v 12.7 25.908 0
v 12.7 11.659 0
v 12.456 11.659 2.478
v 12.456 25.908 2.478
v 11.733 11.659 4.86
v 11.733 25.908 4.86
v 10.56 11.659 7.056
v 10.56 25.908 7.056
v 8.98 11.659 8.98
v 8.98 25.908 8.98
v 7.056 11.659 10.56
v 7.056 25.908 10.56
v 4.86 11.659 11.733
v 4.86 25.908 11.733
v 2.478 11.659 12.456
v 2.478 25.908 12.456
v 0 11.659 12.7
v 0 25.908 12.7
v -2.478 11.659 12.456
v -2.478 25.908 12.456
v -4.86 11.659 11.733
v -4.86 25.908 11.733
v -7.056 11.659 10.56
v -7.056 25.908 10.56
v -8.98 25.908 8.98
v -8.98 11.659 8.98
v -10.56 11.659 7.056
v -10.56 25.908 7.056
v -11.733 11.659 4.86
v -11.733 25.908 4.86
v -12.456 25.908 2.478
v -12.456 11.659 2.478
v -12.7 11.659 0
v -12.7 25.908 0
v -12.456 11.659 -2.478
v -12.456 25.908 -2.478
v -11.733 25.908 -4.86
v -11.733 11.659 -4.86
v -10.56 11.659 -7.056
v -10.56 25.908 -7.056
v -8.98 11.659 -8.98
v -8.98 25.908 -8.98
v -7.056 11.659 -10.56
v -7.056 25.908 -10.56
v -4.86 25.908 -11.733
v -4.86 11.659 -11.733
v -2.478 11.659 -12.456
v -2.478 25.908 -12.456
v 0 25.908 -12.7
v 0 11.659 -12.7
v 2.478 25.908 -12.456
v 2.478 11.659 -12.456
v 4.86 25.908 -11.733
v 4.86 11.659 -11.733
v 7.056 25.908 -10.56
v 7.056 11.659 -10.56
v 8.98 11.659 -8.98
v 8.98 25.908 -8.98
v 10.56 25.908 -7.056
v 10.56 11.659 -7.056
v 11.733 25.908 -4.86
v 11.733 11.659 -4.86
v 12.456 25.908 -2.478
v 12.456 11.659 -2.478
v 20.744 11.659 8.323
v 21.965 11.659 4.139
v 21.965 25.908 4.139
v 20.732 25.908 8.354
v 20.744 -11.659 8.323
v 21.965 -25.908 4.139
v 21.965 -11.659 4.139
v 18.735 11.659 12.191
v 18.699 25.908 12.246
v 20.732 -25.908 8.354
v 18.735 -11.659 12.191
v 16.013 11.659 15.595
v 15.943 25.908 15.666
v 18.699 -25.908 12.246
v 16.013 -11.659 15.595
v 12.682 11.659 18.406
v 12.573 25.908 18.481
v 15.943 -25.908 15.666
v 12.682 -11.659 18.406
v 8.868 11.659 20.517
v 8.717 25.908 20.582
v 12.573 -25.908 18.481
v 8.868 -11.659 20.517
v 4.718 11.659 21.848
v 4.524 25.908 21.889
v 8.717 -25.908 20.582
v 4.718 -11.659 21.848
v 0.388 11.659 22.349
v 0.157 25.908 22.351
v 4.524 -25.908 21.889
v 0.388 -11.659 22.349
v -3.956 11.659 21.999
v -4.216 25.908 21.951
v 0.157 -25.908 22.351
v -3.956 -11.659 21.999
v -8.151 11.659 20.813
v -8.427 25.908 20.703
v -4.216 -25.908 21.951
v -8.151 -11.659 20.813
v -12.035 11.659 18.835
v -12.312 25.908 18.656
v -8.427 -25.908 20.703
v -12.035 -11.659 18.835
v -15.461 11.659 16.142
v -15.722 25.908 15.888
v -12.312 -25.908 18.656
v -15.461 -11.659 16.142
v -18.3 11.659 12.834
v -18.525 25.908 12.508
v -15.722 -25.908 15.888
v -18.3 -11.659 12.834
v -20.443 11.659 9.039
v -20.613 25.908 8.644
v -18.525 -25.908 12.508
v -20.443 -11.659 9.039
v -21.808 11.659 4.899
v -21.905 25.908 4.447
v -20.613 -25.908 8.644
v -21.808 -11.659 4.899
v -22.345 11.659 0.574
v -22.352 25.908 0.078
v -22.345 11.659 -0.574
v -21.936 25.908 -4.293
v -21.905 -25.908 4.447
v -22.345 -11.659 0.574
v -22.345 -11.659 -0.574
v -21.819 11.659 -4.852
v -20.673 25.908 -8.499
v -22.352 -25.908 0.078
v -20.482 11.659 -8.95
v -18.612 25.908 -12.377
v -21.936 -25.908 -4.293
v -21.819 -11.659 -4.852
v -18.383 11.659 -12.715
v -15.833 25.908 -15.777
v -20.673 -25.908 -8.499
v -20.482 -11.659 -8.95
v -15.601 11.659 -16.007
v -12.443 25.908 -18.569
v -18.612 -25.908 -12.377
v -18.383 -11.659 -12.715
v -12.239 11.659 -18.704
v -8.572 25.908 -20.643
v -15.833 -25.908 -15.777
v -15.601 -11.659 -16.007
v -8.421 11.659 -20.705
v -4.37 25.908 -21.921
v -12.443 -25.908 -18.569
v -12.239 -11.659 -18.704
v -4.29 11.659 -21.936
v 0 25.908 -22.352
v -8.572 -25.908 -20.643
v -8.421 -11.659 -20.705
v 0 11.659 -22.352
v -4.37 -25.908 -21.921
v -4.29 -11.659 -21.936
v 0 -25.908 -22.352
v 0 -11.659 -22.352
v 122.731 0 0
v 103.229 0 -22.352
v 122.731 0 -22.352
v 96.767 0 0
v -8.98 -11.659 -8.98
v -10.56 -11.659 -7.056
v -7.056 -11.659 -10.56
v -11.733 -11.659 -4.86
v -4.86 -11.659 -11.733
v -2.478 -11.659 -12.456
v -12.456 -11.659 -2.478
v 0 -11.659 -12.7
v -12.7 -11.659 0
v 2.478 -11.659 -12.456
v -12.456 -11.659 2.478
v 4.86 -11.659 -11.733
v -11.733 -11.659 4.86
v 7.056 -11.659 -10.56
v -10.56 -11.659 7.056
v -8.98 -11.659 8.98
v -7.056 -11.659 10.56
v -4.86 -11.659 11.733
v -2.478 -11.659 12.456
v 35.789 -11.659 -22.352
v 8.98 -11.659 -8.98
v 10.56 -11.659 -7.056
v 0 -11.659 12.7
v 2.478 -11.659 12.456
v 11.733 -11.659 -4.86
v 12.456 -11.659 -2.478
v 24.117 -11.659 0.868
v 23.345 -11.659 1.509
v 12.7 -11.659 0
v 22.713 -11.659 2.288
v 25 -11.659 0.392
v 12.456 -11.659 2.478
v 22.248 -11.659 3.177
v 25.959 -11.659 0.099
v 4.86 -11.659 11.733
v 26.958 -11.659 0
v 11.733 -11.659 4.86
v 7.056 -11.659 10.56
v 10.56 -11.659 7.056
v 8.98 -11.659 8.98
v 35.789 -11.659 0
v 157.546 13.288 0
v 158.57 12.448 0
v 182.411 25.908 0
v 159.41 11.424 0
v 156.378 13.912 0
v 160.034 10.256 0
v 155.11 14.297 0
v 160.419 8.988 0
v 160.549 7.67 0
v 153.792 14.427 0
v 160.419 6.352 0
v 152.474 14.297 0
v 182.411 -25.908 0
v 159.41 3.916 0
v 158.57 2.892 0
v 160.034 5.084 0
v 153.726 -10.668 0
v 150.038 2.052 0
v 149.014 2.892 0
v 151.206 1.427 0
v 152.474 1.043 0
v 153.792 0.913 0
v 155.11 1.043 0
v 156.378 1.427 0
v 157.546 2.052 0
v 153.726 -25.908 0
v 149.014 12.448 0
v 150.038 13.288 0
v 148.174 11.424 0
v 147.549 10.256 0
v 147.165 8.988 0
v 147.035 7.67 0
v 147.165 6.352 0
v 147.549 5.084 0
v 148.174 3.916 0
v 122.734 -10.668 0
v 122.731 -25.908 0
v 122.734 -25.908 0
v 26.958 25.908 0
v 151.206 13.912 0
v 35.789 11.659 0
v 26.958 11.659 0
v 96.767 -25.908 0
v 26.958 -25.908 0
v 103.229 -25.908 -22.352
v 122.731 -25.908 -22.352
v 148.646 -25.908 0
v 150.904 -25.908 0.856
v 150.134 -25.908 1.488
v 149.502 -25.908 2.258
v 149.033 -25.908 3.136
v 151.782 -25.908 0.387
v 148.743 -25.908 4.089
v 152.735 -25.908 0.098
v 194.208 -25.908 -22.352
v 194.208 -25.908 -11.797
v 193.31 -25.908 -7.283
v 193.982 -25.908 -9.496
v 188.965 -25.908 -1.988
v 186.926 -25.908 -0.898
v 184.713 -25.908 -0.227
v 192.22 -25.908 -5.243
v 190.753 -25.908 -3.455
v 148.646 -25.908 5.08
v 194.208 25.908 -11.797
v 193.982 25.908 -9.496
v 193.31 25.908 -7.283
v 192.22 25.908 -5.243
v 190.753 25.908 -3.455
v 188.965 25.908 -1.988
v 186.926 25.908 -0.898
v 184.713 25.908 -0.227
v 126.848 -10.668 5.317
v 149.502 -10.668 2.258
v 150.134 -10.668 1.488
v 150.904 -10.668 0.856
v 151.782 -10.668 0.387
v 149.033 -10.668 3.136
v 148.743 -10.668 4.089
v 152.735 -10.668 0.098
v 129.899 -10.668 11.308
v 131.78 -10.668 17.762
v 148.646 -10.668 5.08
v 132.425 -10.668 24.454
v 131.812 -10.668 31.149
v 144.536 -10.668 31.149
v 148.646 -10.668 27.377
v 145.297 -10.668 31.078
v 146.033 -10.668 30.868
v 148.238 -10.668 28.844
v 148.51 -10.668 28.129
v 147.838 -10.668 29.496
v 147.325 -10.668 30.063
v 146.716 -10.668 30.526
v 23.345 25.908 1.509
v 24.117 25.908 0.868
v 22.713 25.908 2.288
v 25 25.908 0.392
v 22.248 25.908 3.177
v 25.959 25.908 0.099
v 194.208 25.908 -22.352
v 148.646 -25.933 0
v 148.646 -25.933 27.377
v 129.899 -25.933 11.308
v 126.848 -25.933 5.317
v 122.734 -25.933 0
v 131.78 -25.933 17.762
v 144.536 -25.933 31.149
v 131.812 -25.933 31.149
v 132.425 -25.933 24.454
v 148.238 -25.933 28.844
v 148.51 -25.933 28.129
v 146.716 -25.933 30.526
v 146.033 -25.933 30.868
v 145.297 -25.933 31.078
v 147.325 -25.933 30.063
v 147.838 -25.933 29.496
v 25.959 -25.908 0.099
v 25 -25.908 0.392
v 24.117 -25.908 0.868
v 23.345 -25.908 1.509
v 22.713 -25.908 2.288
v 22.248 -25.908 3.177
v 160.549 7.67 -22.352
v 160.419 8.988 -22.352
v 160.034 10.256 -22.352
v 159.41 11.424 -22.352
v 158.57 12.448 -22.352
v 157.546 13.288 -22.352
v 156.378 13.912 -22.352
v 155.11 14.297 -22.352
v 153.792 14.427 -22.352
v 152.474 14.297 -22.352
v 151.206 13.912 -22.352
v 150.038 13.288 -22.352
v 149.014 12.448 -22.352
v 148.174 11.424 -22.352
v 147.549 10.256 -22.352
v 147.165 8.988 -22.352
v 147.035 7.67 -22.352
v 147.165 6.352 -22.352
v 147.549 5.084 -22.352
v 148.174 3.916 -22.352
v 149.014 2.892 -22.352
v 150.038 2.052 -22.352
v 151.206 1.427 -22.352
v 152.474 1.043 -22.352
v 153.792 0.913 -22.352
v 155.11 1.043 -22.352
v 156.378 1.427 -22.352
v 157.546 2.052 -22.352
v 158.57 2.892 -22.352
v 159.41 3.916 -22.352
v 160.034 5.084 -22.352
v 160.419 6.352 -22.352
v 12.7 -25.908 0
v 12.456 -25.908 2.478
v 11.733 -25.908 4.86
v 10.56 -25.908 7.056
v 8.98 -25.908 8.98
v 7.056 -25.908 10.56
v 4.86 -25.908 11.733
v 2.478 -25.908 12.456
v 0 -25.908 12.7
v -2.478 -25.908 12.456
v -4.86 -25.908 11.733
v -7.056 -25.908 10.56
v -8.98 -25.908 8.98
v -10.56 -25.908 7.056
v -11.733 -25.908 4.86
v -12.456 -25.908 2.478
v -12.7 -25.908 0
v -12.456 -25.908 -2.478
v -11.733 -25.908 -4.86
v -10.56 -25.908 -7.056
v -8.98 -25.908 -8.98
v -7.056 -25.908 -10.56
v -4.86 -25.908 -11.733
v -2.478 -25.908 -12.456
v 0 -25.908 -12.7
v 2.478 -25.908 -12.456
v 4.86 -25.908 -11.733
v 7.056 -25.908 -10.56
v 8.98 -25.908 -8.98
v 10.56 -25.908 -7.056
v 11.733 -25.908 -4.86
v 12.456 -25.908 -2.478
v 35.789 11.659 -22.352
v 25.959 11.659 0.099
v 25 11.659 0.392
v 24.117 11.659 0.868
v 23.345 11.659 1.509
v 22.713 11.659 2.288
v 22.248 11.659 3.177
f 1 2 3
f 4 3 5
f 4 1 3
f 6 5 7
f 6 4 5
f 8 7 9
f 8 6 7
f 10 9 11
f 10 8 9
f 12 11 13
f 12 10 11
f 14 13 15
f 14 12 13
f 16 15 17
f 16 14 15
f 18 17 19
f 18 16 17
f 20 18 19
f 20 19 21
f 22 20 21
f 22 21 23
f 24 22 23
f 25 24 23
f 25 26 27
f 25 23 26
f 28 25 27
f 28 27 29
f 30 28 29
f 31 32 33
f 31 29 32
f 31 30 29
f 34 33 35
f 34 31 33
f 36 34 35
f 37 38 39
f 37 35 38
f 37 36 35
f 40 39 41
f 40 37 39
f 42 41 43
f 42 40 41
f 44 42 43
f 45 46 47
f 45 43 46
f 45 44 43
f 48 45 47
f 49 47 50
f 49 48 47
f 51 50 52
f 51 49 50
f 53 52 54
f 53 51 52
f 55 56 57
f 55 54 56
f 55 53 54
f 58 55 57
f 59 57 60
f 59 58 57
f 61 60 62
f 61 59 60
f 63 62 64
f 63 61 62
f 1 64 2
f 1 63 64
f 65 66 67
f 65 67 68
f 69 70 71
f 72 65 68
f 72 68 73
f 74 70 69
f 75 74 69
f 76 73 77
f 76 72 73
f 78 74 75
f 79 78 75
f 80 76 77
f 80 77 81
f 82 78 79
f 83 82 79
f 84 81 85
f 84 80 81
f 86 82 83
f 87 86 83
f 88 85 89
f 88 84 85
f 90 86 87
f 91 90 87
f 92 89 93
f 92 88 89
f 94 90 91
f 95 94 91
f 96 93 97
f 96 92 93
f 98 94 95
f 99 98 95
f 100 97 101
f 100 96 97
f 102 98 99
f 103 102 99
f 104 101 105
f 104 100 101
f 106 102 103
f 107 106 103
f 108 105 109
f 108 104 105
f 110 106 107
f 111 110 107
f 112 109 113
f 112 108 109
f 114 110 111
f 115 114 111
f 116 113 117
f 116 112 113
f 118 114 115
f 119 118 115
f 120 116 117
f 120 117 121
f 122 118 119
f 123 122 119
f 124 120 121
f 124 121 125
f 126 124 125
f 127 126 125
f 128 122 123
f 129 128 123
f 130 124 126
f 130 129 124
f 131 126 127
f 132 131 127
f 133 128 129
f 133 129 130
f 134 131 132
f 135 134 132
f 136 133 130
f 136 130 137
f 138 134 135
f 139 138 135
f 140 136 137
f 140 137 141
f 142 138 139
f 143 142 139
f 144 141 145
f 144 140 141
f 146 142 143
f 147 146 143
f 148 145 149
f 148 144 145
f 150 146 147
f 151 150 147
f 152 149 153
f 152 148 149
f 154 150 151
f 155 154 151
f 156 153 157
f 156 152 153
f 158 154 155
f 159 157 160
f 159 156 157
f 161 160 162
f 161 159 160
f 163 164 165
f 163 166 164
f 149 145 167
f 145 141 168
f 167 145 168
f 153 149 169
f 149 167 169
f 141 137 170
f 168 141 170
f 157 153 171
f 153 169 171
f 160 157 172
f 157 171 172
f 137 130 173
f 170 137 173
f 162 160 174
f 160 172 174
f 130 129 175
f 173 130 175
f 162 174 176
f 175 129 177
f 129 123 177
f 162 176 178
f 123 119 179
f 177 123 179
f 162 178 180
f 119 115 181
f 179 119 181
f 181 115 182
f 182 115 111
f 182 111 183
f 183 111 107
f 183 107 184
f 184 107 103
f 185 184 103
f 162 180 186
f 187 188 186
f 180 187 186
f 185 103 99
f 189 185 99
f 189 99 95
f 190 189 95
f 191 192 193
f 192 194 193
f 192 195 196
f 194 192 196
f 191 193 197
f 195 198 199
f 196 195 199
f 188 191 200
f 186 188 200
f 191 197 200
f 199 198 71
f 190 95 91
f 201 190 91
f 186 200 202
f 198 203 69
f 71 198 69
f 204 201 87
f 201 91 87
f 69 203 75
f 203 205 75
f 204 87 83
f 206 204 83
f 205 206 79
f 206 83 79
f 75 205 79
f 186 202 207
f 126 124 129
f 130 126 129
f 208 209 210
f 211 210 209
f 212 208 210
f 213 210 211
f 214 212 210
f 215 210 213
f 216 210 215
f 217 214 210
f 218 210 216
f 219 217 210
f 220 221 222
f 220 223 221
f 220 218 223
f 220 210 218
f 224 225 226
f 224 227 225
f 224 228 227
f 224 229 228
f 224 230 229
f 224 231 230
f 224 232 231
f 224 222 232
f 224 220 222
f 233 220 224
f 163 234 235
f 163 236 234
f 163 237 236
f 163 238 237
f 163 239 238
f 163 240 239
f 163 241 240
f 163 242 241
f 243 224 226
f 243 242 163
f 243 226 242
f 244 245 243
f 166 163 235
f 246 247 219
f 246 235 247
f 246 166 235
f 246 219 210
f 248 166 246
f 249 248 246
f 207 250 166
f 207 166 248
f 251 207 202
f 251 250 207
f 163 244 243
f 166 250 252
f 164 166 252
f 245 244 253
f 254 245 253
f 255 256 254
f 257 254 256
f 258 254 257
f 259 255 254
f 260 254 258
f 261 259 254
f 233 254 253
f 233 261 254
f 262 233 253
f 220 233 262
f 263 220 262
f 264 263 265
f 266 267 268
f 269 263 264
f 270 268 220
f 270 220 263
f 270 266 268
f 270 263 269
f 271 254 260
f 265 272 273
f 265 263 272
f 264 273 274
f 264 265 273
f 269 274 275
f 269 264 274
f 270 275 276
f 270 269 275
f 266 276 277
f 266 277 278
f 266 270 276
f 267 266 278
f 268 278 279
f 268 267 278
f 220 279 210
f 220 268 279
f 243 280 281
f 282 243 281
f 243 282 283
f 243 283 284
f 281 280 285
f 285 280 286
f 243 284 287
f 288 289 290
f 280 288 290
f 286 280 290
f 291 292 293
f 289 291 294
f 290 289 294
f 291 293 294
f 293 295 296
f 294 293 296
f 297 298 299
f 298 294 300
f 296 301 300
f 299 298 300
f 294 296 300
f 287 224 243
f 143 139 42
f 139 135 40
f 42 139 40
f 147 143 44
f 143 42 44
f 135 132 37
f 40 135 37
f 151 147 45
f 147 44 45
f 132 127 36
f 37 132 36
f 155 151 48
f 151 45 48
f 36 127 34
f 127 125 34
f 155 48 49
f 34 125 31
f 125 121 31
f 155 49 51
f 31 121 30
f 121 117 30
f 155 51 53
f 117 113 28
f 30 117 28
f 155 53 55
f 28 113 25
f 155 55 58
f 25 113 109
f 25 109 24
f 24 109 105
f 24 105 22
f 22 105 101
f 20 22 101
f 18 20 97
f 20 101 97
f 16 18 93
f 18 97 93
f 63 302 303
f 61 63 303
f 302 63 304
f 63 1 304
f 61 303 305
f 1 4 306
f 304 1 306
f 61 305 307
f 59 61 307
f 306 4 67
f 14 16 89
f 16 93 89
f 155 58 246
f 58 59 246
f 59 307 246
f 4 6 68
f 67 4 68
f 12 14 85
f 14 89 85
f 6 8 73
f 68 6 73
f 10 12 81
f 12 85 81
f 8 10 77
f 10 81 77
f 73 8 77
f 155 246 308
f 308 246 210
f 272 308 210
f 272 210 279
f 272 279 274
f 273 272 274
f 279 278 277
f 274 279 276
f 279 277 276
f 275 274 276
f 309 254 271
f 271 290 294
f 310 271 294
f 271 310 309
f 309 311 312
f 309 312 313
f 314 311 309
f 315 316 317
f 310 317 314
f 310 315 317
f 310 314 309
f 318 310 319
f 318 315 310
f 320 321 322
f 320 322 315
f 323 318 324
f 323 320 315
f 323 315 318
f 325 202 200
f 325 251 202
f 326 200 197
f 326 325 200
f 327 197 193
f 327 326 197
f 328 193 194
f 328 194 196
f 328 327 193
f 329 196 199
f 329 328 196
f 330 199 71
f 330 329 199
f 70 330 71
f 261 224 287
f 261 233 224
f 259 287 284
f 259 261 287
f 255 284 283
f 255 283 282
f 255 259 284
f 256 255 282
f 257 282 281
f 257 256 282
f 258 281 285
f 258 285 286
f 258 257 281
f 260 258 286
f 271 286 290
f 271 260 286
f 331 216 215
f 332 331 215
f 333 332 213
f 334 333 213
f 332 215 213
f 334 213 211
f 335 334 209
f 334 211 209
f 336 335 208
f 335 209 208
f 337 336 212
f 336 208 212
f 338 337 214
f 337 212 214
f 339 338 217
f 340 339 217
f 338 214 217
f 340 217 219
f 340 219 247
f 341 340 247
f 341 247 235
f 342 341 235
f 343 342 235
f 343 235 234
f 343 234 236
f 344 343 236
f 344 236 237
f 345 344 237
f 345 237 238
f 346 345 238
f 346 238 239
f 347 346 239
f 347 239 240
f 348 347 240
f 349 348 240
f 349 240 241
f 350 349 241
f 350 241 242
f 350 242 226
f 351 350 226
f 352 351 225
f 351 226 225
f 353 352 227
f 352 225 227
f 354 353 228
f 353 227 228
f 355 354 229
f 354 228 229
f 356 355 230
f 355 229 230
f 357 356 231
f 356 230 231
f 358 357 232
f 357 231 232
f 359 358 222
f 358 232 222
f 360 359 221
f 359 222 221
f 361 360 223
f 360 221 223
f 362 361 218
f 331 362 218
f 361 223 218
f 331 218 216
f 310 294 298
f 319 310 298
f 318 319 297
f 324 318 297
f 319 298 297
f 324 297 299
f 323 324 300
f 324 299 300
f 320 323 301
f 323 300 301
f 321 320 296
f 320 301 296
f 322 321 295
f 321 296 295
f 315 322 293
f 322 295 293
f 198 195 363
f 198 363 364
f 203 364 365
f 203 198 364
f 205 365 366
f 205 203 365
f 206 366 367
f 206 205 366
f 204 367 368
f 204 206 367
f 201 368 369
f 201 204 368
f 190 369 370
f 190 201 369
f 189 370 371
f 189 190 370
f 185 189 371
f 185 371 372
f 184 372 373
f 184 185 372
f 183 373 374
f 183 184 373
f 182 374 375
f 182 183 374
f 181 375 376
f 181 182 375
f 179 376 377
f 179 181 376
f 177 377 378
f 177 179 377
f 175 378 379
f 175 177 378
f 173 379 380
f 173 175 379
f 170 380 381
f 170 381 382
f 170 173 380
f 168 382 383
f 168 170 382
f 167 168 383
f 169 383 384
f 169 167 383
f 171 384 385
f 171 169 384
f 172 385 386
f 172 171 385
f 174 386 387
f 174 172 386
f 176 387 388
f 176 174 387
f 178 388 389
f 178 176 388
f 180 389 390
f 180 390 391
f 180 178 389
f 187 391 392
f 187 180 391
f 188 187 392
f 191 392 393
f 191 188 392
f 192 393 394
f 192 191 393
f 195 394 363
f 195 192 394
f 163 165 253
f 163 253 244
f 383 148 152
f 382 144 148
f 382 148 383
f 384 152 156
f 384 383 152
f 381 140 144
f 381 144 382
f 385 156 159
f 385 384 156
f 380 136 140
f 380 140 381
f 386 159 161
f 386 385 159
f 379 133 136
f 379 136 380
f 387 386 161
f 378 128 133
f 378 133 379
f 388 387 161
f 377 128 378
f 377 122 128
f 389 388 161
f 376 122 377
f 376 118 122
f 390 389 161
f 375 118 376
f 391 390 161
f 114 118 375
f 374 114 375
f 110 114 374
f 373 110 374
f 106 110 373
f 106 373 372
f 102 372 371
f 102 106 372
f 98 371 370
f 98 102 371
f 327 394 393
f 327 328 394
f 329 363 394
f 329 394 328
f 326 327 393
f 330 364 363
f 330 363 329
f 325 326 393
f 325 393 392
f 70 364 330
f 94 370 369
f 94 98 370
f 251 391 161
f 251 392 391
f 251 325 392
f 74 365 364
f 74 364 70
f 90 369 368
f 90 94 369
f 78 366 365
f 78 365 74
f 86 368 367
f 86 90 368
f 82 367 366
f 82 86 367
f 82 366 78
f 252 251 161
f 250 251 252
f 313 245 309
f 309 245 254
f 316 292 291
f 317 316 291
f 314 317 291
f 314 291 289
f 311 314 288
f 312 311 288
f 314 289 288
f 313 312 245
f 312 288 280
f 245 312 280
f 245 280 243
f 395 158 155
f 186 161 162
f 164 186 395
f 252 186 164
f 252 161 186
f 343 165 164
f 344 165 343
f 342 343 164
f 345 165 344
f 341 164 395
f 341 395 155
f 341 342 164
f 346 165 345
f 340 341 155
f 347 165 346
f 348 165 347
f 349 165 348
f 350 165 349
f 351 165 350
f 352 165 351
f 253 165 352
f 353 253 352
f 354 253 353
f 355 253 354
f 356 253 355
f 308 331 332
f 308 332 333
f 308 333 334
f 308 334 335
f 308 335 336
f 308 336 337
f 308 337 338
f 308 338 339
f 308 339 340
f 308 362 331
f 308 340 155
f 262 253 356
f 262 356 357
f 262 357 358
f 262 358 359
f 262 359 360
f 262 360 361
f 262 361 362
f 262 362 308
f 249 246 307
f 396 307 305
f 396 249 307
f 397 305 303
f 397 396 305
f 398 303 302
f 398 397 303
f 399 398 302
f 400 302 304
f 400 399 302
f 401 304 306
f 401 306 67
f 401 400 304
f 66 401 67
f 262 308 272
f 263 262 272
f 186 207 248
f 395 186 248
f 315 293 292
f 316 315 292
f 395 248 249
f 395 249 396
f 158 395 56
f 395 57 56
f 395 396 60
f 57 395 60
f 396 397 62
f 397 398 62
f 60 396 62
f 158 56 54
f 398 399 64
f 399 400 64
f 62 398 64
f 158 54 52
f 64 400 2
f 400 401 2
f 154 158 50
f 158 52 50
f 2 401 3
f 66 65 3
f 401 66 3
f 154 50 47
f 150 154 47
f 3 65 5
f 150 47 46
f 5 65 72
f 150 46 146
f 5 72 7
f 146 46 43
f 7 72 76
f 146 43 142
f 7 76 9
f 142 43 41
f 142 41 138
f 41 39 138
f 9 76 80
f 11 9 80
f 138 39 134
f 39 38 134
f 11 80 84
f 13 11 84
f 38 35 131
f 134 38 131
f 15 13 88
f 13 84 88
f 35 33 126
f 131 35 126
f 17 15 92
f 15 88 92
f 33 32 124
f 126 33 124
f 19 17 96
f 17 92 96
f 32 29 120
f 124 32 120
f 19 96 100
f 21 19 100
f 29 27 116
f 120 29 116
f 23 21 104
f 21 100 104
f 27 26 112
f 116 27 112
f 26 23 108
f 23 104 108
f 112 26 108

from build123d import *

# Parameters (mm, degrees)
F0_R          = 12.7
F4_DEPTH      = 25.908
F5_DEPTH      = 14.732
F5_DEPTH_BACK = 0.5334
F6_DEPTH      = 51.816
F7_R          = 6.7567647924
F8_DEPTH      = 76.454
F10_DEPTH     = 115.57
F11_R         = 5.08


with BuildPart() as f4:
    # F0 (on Front) → F4 (new body, symmetric)
    with BuildSketch(Plane.XZ):
        with BuildLine():
            Line((182.4113020967, 0), (22.352, 0))
            ThreePointArc((22.352, 0), (-15.8052507731, 15.8052507731), (0, -22.352))
            Line((0, -22.352), (194.2084, -22.352))
            Line((194.2084, -22.352), (194.2084, -11.7970979033))
            ThreePointArc((194.2084, -11.7970979033), (190.7531100225, -3.4552899775), (182.4113020967, 0))
        make_face()
        Circle(F0_R, mode=Mode.SUBTRACT)
    extrude(amount=F4_DEPTH, both=True)

    # F3 (on offset) → F5 (join, two sides)
    with BuildSketch(Plane.XZ.offset(25.4)) as f5_sk:
        with BuildLine():
            ThreePointArc((131.8115741014, 31.148834154), (130.990690219, 14.4909643817), (122.7341517806, 0))
            Line((122.7341517806, 0), (148.645862937, 0))
            Line((148.645862937, 0), (148.645862937, 27.3769088089))
            ThreePointArc((148.645862937, 27.3769088089), (147.3251483028, 30.062921432), (144.5359289646, 31.148834154))
            Line((144.5359289646, 31.148834154), (131.8115741014, 31.148834154))
        make_face()
    extrude(amount=-F5_DEPTH)
    extrude(f5_sk.sketch, amount=F5_DEPTH_BACK)

    # F1 (on Top) → F6 (cut, symmetric)
    with BuildSketch(Plane.XY):
        Polygon((-22.3446302116, 11.6586), (-22.3446302116, 0), (-22.3446302116, -11.6587262601), (35.7894971967, -11.6587262601), (35.7894971967, 11.6586), align=None)
    extrude(amount=F6_DEPTH, both=True, mode=Mode.SUBTRACT)

    # F7 (on Top) → F8 (cut)
    with BuildSketch(Plane.XY):
        with Locations((153.7918448448, 7.6698409393)):
            Circle(F7_R)
    extrude(amount=-F8_DEPTH, mode=Mode.SUBTRACT)

    # F9 (on Front) → F10 (cut)
    with BuildSketch(Plane.XZ):
        Polygon((122.7312460542, -22.4210973829), (122.7312460542, 0), (96.7673584819, 0), (103.2488569617, -22.4210973829), align=None)
    extrude(amount=F10_DEPTH, mode=Mode.SUBTRACT)

    # F11
    f11_edges = [f4.edges().sort_by_distance(p)[0] for p in [
        (22.352, -18.783363, 0),
        (22.352, 18.7833, 0),
        (148.645863, -18.288, 0),
    ]]
    fillet(f11_edges, radius=F11_R)


solid = f4.part
